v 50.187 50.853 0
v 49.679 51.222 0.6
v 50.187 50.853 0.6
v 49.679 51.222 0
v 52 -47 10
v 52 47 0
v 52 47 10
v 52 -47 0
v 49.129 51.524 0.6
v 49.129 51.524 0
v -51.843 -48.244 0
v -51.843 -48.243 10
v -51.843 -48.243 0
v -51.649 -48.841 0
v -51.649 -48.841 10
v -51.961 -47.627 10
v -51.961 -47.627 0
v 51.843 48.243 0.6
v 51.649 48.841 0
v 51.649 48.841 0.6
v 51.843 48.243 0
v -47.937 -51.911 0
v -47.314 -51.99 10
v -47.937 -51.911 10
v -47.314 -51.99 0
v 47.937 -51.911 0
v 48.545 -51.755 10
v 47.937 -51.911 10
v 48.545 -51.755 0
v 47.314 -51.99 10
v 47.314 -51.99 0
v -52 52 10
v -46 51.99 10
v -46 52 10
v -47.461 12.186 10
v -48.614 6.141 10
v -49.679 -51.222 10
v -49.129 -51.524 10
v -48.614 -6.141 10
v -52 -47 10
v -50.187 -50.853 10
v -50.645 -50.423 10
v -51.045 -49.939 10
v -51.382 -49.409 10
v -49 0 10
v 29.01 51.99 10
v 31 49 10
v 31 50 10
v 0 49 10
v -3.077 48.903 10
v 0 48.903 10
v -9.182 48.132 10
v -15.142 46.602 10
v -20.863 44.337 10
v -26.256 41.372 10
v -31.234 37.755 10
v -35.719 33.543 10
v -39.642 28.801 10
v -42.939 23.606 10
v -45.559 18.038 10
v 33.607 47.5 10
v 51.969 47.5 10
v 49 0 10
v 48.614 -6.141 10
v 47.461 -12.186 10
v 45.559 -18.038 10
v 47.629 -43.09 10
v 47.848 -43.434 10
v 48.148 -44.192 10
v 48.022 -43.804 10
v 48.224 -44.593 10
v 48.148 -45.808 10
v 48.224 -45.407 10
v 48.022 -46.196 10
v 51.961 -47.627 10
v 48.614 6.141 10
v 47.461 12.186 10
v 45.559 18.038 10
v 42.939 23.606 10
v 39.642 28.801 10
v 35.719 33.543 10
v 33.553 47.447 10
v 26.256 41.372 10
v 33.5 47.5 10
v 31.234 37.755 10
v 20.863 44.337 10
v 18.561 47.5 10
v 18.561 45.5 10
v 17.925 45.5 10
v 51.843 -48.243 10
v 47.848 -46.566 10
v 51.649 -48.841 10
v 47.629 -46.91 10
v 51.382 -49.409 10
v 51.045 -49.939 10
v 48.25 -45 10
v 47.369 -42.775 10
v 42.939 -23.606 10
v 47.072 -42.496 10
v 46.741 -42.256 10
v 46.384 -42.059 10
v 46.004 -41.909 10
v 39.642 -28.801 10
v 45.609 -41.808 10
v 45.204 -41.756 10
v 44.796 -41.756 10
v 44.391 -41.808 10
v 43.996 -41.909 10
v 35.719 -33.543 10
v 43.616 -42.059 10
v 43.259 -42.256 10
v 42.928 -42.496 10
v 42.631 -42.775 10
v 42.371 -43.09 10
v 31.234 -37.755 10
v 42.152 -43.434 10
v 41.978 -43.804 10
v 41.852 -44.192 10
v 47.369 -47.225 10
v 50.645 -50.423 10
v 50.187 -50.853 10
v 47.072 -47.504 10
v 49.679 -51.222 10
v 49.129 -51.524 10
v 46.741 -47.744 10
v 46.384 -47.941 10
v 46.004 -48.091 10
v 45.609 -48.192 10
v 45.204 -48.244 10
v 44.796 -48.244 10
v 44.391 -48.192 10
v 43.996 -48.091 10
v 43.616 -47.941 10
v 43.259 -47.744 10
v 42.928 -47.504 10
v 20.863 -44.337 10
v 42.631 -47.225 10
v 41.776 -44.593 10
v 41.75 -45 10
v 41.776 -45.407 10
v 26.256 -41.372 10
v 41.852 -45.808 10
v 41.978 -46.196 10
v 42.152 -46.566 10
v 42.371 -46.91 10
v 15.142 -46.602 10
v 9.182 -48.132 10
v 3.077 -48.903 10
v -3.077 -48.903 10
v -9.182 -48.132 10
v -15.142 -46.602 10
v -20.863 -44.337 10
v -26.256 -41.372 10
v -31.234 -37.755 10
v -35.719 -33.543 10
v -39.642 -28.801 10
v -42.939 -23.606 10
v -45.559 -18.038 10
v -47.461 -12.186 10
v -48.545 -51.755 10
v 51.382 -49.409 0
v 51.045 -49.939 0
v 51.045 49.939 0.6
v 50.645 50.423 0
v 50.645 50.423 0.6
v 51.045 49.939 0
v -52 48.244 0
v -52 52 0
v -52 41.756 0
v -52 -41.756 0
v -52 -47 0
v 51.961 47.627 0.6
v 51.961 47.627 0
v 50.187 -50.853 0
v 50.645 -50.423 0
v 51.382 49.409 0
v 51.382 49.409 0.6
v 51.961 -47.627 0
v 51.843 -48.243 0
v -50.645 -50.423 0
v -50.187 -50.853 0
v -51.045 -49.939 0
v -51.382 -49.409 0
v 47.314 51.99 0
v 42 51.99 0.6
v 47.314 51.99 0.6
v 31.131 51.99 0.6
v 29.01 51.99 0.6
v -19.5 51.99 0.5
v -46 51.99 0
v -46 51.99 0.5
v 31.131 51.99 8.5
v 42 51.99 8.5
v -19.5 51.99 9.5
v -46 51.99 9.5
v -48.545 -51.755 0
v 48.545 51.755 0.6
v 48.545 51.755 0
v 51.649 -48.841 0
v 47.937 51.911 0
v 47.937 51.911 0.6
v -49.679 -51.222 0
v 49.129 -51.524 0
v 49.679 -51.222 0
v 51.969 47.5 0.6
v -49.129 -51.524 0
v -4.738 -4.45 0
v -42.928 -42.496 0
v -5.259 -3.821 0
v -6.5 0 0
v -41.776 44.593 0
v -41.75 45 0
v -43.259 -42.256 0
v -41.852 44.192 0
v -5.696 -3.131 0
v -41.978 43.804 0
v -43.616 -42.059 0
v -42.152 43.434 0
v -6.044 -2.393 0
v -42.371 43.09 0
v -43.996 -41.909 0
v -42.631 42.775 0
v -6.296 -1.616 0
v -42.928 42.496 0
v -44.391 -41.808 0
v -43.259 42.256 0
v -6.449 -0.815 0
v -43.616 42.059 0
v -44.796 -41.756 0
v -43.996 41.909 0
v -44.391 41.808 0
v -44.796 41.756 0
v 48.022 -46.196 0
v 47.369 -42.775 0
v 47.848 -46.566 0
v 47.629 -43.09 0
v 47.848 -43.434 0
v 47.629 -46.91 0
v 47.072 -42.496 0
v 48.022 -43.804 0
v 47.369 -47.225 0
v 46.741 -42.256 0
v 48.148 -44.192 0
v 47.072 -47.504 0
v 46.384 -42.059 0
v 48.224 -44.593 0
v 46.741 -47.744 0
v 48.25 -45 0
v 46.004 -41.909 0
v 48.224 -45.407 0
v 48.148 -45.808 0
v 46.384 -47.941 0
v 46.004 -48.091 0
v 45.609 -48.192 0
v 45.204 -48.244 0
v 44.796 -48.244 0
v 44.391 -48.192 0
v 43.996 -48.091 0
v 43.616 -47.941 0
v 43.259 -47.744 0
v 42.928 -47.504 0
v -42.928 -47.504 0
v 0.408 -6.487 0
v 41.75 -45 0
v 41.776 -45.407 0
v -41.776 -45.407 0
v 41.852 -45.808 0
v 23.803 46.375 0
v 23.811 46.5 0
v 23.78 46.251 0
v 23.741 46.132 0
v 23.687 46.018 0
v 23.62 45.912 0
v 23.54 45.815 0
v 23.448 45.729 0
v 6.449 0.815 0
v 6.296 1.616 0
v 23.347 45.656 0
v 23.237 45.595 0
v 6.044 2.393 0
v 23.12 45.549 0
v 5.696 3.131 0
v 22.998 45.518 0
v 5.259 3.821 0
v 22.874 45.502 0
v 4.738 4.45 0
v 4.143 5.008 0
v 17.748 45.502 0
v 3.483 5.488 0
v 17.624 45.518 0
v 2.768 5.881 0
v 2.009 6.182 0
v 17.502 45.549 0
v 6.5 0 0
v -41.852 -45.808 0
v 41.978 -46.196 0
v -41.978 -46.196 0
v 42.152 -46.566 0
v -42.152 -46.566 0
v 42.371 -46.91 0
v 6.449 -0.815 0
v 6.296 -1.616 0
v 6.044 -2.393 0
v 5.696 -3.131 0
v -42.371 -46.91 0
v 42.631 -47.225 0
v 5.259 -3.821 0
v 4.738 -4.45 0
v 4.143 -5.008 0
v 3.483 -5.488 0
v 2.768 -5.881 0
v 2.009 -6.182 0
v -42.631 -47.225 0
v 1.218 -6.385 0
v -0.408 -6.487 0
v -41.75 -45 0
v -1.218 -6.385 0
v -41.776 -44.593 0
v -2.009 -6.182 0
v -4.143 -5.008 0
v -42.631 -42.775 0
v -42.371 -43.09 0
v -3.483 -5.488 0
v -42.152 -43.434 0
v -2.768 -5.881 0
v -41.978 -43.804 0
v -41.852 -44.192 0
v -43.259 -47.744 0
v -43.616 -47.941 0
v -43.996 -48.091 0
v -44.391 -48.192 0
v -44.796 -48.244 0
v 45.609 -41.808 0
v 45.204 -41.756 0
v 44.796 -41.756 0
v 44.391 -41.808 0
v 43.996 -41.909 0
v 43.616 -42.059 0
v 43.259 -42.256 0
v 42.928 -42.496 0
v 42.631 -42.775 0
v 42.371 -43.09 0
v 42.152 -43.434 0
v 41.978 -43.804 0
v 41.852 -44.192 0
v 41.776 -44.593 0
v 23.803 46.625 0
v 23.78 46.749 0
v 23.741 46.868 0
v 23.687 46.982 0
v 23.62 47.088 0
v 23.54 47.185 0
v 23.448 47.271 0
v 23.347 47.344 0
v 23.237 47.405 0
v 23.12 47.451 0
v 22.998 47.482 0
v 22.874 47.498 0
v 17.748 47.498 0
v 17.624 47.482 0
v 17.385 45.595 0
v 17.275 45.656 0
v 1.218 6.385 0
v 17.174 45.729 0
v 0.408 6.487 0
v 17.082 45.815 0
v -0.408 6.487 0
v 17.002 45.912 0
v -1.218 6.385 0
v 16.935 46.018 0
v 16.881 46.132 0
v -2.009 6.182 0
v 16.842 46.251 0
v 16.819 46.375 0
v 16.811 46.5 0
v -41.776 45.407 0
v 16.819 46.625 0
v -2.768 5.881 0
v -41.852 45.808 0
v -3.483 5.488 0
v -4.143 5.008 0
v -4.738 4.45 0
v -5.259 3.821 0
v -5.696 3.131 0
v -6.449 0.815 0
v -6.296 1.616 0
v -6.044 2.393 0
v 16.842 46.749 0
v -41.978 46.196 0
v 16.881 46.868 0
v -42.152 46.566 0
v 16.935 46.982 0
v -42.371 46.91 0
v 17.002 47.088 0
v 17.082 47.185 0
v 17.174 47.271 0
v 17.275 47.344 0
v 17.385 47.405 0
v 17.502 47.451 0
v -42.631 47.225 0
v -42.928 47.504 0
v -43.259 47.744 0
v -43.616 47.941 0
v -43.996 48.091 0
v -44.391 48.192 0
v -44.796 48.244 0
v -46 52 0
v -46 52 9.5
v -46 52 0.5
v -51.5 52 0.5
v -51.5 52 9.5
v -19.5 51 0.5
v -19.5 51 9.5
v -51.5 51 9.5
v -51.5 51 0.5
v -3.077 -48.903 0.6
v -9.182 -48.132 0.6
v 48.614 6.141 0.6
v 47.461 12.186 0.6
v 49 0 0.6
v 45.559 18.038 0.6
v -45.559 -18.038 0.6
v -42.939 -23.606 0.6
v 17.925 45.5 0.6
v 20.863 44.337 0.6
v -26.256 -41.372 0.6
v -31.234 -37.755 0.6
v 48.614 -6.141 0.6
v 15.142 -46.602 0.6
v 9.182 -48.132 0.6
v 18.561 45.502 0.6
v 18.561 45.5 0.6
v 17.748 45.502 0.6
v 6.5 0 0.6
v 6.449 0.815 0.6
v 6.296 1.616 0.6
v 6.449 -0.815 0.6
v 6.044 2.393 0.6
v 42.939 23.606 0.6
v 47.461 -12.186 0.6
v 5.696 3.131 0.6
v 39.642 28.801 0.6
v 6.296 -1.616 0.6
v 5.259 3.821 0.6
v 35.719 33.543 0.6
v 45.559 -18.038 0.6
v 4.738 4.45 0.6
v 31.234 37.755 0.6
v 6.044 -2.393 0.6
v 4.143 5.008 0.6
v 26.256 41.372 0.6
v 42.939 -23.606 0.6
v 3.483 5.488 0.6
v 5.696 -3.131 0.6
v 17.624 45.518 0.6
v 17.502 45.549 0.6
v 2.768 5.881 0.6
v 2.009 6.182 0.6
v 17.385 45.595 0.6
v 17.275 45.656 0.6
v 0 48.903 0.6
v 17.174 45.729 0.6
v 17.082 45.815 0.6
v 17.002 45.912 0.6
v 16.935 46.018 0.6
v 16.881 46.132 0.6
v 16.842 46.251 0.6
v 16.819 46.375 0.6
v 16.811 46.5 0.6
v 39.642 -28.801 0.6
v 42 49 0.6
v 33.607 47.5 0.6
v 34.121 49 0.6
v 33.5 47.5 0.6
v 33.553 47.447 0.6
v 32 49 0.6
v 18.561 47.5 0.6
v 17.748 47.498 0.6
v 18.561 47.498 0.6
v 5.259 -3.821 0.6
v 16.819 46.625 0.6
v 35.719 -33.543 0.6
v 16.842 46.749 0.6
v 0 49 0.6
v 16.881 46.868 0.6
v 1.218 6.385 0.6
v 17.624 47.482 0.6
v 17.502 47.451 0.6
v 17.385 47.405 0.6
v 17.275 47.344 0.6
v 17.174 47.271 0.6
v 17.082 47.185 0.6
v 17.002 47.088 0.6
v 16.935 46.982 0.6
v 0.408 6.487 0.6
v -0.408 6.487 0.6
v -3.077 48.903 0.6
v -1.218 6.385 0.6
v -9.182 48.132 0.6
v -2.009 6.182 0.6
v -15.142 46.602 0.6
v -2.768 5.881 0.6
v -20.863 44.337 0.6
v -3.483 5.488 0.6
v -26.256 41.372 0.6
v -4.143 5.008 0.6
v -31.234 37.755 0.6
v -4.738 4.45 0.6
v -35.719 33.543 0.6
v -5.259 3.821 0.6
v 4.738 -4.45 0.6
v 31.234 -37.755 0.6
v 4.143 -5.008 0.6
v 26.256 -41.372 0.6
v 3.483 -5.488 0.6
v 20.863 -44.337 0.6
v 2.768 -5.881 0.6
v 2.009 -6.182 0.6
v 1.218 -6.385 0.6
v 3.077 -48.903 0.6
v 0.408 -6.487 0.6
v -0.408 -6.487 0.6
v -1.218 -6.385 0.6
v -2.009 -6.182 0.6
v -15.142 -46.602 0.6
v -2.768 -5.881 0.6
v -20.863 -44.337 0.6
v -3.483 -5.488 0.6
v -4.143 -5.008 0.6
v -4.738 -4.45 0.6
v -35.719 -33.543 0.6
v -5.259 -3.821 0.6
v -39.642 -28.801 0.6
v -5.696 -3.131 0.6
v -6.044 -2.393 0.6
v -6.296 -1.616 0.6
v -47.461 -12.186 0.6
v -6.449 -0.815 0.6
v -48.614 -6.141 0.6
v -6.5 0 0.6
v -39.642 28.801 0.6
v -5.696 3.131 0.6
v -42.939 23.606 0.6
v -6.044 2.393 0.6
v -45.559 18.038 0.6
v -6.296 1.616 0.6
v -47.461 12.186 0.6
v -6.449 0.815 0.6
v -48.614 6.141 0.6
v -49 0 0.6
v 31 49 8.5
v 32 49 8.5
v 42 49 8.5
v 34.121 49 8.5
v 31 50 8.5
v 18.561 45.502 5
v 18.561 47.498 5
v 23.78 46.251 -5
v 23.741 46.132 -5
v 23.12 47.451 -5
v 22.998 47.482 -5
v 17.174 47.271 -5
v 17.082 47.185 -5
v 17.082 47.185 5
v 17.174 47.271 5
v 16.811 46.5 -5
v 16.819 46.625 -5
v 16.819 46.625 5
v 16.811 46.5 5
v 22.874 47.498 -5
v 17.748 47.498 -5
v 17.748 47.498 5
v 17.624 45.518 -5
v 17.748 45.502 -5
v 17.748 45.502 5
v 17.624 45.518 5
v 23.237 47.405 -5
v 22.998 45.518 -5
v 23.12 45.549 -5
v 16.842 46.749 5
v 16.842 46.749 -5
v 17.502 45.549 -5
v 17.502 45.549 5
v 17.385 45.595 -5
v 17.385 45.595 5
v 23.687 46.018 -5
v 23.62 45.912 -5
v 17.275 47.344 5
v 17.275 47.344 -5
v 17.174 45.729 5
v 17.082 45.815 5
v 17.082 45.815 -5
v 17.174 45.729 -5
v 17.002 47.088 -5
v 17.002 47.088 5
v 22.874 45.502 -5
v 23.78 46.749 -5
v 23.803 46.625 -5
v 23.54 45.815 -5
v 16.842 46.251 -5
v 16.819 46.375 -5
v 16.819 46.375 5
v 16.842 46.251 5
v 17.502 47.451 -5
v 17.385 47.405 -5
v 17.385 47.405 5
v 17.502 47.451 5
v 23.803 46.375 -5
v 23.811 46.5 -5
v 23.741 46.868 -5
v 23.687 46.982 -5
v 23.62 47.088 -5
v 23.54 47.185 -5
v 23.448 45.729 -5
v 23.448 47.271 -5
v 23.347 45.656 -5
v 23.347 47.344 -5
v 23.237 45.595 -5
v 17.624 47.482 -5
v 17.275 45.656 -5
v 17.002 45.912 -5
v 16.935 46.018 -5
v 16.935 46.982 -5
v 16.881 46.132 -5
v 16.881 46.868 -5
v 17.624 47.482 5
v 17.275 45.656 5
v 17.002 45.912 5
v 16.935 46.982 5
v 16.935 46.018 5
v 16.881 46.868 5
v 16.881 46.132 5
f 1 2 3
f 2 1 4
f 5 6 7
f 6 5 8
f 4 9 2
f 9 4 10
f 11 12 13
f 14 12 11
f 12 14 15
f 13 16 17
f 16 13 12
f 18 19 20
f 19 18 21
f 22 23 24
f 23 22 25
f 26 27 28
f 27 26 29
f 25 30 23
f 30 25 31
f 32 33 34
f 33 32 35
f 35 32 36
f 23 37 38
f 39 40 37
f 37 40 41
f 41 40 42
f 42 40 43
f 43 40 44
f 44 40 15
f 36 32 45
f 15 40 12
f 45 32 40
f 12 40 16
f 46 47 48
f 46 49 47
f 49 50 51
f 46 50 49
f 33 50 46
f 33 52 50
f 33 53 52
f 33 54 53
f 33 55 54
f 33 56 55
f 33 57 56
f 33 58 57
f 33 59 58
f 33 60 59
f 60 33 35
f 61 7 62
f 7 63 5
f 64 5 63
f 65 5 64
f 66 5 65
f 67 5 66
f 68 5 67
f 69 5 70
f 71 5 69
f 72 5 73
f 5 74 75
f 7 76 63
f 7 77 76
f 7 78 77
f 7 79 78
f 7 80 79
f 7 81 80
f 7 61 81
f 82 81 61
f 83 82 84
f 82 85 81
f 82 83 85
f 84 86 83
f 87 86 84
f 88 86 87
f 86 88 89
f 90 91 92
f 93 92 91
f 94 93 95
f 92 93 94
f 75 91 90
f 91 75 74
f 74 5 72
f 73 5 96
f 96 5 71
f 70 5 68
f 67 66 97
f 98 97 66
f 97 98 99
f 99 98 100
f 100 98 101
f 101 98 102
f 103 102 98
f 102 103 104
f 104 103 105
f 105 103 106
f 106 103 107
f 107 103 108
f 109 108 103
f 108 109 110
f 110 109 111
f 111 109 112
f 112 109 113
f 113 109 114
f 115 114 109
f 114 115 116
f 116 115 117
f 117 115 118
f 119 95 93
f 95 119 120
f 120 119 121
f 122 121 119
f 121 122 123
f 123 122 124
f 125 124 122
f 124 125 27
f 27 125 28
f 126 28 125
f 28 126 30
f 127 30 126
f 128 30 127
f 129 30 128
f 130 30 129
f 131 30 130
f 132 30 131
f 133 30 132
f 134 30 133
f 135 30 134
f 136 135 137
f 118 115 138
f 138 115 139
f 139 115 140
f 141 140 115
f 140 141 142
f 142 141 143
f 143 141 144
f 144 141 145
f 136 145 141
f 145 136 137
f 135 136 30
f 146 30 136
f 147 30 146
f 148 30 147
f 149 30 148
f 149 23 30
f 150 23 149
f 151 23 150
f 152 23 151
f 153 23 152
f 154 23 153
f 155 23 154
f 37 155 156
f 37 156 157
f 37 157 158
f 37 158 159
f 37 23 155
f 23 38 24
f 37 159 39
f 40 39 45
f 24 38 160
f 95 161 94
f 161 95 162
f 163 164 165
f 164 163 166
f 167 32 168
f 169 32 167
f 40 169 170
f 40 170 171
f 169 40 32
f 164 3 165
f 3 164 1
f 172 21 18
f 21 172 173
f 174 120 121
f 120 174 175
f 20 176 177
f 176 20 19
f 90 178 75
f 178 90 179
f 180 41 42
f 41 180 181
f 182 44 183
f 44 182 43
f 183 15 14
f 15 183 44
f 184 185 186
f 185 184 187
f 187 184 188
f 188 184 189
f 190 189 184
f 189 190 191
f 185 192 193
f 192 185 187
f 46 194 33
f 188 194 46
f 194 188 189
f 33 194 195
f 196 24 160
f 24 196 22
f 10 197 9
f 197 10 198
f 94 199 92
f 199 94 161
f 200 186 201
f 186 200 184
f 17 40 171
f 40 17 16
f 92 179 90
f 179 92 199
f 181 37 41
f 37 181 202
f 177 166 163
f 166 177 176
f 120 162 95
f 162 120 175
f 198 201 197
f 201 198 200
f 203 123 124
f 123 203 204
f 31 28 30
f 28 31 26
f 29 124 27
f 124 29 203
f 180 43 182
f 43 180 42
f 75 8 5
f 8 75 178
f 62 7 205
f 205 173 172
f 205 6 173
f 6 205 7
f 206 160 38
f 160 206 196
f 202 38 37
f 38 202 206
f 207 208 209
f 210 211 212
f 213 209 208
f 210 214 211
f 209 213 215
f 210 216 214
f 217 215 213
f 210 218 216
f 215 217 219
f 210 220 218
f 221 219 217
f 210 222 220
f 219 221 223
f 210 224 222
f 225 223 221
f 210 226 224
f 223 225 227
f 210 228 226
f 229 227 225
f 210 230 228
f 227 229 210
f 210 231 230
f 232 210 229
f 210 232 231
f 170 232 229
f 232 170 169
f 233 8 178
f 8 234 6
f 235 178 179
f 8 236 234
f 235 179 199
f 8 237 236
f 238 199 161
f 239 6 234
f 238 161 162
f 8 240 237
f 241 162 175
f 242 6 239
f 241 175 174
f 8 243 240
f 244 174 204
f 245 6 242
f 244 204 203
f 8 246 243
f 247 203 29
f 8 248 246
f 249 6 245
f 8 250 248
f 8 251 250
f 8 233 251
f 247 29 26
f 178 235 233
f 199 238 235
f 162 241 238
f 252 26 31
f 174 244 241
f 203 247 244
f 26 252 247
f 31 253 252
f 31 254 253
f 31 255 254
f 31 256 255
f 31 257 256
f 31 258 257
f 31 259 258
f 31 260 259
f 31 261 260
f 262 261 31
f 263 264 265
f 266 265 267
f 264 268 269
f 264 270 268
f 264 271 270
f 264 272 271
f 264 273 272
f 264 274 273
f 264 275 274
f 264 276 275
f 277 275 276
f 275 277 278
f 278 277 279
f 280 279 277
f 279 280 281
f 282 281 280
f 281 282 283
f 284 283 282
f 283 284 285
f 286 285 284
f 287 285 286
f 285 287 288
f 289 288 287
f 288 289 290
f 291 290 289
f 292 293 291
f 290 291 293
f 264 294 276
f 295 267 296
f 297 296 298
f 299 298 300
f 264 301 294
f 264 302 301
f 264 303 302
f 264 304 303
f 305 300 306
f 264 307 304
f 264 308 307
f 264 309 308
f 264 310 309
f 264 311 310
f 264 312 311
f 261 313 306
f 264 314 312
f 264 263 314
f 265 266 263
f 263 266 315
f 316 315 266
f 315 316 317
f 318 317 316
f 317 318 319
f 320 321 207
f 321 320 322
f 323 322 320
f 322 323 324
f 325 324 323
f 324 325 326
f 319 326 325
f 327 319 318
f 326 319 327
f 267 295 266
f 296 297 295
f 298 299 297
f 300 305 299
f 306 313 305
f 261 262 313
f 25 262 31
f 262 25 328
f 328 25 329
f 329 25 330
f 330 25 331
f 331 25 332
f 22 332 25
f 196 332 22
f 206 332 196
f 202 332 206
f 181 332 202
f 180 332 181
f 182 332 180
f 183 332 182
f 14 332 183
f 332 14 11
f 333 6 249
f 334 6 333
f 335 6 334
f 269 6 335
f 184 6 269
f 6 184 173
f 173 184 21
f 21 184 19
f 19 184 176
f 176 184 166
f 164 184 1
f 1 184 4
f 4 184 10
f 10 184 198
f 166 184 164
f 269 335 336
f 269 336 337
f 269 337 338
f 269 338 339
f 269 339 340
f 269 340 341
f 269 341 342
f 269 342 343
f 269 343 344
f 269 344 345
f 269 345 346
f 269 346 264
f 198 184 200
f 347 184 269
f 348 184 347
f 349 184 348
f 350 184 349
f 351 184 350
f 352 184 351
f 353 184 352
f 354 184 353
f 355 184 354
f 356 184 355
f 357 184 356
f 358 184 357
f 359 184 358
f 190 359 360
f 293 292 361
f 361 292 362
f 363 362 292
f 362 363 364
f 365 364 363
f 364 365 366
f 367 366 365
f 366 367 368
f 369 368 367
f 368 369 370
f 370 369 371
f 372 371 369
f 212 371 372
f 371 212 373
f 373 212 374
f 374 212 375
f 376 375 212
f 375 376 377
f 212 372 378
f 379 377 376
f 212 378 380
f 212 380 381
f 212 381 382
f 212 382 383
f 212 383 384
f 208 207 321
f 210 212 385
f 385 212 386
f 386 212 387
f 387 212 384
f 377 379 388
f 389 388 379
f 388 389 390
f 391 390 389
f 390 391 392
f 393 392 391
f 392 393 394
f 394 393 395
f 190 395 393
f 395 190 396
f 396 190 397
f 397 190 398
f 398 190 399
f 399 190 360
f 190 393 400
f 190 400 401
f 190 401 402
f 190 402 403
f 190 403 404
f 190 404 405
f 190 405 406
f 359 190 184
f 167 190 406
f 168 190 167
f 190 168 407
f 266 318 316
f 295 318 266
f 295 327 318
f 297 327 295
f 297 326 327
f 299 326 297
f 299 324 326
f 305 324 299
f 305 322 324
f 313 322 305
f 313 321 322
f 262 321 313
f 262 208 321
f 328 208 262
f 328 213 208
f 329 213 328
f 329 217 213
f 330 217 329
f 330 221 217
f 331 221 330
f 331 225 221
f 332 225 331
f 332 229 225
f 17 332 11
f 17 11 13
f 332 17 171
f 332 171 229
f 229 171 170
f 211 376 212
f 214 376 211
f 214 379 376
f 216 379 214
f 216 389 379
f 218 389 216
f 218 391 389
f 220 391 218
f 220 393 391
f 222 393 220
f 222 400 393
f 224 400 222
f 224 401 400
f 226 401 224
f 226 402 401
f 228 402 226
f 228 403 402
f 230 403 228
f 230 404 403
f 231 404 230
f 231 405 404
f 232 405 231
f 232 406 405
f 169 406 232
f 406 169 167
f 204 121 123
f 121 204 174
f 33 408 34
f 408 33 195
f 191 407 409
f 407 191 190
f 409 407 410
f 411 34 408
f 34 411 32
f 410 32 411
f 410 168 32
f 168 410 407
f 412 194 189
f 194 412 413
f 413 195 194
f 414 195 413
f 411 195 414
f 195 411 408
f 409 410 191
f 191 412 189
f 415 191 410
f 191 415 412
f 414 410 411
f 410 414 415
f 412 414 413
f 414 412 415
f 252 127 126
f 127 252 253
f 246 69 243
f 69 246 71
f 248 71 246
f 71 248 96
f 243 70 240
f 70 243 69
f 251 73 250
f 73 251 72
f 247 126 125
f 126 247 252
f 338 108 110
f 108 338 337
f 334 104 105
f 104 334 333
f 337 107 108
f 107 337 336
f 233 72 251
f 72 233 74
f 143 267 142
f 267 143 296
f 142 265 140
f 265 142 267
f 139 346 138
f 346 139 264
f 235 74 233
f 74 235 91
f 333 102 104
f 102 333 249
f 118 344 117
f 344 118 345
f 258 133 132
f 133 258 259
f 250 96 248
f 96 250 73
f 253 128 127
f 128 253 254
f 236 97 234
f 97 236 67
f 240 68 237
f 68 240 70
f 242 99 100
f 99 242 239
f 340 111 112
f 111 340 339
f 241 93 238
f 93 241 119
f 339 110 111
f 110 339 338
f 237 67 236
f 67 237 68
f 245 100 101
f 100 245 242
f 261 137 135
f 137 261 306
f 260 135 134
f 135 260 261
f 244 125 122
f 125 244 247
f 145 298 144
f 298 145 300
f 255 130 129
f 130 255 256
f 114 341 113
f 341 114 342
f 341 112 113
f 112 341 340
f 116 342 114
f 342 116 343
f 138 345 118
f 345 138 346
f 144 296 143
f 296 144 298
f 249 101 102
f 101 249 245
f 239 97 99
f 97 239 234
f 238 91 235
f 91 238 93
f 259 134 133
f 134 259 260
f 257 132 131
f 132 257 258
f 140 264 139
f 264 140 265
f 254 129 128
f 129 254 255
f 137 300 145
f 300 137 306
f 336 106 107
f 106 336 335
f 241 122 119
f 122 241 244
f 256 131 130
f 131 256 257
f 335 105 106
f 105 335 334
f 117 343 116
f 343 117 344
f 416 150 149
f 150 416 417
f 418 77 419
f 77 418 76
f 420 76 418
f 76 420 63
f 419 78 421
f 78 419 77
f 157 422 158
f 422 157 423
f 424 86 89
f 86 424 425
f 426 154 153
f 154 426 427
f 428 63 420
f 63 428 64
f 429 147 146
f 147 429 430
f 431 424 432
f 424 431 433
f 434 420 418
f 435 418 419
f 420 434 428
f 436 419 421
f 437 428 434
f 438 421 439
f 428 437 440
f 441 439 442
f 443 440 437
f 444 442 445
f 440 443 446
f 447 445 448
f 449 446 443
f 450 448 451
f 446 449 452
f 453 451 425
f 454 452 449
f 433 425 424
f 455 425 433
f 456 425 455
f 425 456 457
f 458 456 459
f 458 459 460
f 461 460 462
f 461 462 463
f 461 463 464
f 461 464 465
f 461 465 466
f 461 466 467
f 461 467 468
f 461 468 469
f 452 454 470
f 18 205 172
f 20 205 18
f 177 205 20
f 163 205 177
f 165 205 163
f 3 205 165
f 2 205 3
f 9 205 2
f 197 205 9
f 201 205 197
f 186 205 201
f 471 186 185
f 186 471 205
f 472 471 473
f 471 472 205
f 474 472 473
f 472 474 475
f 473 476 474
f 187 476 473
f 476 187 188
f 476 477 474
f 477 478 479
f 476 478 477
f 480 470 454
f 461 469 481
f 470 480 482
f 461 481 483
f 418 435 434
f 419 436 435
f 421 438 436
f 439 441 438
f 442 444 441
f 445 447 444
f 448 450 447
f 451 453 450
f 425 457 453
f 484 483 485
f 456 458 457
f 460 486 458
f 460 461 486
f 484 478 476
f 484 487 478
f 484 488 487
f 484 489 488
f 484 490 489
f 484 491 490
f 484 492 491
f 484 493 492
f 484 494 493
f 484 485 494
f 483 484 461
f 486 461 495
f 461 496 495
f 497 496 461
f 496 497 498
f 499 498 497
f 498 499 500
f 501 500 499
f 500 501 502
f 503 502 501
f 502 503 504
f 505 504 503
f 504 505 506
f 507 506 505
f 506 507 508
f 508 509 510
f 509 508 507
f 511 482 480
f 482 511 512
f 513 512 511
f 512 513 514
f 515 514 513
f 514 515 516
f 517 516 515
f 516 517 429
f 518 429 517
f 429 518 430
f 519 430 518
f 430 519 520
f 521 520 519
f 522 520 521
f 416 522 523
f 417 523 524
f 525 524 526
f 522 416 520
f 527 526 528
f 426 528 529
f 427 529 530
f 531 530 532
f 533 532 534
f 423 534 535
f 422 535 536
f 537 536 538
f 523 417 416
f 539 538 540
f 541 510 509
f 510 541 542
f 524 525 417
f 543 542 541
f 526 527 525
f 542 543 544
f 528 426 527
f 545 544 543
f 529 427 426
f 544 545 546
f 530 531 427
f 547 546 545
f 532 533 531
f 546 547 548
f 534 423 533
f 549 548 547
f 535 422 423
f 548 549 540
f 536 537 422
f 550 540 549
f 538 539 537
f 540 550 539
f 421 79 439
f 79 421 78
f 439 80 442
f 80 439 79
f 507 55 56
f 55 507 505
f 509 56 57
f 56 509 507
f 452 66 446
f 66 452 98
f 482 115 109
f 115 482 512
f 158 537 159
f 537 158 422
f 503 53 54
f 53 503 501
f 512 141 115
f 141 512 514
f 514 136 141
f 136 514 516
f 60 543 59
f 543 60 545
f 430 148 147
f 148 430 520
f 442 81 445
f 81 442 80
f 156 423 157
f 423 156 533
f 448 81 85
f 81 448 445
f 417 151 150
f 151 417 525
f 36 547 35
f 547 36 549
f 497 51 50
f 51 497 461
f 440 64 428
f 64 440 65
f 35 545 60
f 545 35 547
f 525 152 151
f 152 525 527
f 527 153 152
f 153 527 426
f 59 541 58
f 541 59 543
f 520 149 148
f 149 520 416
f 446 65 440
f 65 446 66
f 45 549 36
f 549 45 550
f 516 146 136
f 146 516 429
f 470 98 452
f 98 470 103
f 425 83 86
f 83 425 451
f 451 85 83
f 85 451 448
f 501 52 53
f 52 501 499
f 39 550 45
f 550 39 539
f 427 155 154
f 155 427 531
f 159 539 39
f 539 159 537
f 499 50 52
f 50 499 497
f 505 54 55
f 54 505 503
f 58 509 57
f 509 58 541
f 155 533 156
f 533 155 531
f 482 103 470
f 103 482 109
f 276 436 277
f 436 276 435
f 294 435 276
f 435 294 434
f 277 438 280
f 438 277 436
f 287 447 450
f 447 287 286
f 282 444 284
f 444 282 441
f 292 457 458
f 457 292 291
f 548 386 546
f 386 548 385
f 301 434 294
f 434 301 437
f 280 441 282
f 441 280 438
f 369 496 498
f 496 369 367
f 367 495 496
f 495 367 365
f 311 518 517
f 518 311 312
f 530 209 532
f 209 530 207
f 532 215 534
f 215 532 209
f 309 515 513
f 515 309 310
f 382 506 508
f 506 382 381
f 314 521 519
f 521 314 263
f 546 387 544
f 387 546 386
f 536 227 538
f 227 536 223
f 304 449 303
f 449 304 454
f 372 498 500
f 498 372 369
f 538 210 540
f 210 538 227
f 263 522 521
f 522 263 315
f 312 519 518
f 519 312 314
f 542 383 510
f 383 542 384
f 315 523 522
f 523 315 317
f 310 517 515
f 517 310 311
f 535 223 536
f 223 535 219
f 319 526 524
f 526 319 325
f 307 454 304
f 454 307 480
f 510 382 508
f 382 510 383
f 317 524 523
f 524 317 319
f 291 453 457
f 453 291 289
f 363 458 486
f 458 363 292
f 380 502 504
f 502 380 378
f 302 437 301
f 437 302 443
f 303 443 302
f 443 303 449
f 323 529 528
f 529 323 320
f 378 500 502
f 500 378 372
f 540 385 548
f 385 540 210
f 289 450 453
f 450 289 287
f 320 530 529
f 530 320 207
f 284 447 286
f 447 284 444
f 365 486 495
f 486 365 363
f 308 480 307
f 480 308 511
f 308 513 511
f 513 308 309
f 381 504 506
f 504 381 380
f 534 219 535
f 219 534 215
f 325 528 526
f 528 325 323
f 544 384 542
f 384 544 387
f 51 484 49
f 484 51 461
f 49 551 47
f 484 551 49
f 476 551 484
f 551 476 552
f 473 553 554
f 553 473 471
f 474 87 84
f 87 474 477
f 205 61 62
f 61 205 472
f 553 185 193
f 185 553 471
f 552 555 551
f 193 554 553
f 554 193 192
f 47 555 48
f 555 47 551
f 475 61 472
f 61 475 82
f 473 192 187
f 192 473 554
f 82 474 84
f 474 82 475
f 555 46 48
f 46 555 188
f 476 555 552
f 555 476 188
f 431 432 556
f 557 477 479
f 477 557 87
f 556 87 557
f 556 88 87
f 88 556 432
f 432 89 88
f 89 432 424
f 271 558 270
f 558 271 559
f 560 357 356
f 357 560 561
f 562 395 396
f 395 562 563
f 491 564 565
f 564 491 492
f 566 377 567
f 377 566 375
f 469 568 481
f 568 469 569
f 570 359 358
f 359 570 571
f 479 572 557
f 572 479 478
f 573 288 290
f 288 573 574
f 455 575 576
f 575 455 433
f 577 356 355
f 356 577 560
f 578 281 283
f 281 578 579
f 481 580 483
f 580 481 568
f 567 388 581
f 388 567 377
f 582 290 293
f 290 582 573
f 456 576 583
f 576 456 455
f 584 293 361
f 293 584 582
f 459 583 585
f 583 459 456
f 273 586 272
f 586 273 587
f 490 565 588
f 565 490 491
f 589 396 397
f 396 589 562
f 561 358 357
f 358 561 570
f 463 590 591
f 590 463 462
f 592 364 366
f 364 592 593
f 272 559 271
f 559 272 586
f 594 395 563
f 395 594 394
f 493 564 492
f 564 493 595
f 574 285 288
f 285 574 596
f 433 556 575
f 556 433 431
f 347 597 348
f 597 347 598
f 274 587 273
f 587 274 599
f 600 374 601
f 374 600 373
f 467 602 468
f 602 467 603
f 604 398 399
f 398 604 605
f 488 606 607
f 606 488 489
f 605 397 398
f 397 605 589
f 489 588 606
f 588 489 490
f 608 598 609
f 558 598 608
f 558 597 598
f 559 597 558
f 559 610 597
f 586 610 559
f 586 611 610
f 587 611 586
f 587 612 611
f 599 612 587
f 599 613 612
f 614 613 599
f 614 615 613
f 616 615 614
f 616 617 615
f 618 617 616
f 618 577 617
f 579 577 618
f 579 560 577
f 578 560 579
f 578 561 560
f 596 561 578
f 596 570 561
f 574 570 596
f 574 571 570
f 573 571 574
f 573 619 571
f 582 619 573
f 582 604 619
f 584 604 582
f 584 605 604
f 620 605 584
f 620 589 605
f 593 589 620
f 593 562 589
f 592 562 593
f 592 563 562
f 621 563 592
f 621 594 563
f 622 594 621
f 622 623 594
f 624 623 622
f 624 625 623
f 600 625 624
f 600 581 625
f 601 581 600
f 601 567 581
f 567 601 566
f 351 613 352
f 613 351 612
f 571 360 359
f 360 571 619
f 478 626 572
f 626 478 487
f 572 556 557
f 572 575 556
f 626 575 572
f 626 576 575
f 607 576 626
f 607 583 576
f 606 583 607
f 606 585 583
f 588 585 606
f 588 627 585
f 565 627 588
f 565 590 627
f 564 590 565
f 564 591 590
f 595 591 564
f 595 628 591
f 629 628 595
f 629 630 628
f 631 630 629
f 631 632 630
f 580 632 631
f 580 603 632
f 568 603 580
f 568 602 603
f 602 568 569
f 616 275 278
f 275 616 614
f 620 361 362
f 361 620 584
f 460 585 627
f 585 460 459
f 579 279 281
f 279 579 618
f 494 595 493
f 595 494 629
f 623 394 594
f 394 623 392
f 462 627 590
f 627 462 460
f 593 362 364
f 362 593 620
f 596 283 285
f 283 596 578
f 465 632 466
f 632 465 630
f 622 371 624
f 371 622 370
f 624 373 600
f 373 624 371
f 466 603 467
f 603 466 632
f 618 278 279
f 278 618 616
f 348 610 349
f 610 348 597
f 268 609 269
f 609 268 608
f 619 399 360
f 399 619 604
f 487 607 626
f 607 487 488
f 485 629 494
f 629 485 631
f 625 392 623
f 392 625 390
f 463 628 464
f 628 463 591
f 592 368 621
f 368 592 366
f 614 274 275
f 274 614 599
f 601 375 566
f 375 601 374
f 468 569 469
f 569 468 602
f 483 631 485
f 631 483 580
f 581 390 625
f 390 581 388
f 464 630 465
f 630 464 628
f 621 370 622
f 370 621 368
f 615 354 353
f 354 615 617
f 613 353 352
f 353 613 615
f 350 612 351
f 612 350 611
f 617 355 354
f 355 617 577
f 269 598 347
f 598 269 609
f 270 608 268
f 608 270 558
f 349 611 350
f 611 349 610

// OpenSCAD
$fn = 50;


union() {
	difference() {
		union() {
			hull() {
				translate(v = [-47.0000000000, 47.0000000000, 0]) {
					cylinder(h = 10, r = 5);
				}
				translate(v = [47.0000000000, 47.0000000000, 0]) {
					cylinder(h = 10, r = 5);
				}
				translate(v = [-47.0000000000, -47.0000000000, 0]) {
					cylinder(h = 10, r = 5);
				}
				translate(v = [47.0000000000, -47.0000000000, 0]) {
					cylinder(h = 10, r = 5);
				}
			}
			translate(v = [-52.0000000000, 46.0000000000, 0]) {
				cube(size = [6, 6, 10]);
			}
		}
		union() {
			translate(v = [-52.5000000000, -45.0000000000, -250.0000000000]) {
				rotate(a = [0, 0, 0]) {
					difference() {
						union() {
							hull() {
								translate(v = [7.5000000000, 0, 0]) {
									cylinder(h = 250, r = 3.2500000000, r1 = 3.2500000000, r2 = 3.2500000000);
								}
								translate(v = [-7.5000000000, 0, 0]) {
									cylinder(h = 250, r = 3.2500000000, r1 = 3.2500000000, r2 = 3.2500000000);
								}
							}
						}
						union();
					}
				}
			}
			translate(v = [-52.5000000000, 45.0000000000, -250.0000000000]) {
				rotate(a = [0, 0, 0]) {
					difference() {
						union() {
							hull() {
								translate(v = [7.5000000000, 0, 0]) {
									cylinder(h = 250, r = 3.2500000000, r1 = 3.2500000000, r2 = 3.2500000000);
								}
								translate(v = [-7.5000000000, 0, 0]) {
									cylinder(h = 250, r = 3.2500000000, r1 = 3.2500000000, r2 = 3.2500000000);
								}
							}
						}
						union();
					}
				}
			}
			translate(v = [-51.5000000000, 51.0000000000, 0.5000000000]) {
				cube(size = [32, 1, 9.0000000000]);
			}
			translate(v = [45.0000000000, -45.0000000000, 0]) {
				cylinder(h = 100, r = 3.2500000000);
			}
			translate(v = [0, 0, 0.6000000000]) {
				cylinder(h = 12.4000000000, r = 49.0000000000);
			}
			translate(v = [0, 0, -5.0000000000]) {
				cylinder(h = 10, r = 6.5000000000);
			}
			translate(v = [0.0000000000, 47.5000000000, 0.6000000000]) {
				cube(size = [52.0000000000, 1.5000000000, 12.4000000000]);
			}
			translate(v = [42.0000000000, 47.5000000000, 0.6000000000]) {
				cube(size = [10, 4.5000000000, 12.4000000000]);
			}
			translate(v = [31.0000000000, 47.5000000000, 8.5000000000]) {
				cube(size = [21, 4.5000000000, 1.5000000000]);
			}
			translate(v = [28.2500000000, 52.7500000000, 0.6000000000]) {
				rotate(a = [0, 0, -45]) {
					cube(size = [7.5000000000, 1.5000000000, 12.4000000000]);
				}
			}
			translate(v = [11.0610000000, 45.5000000000, 0.6000000000]) {
				cube(size = [7.5000000000, 2, 9.4000000000]);
			}
		}
	}
	union() {
		translate(v = [20.3110000000, 46.5000000000, -5.0000000000]) {
			rotate(a = [0, 0, 0]) {
				difference() {
					union() {
						#hull() {
							#translate(v = [2.5000000000, 0, 0]) {
								cylinder(h = 10, r = 1.0000000000, r1 = 1.0000000000, r2 = 1.0000000000);
							}
							#translate(v = [-2.5000000000, 0, 0]) {
								cylinder(h = 10, r = 1.0000000000, r1 = 1.0000000000, r2 = 1.0000000000);
							}
						}
					}
					union();
				}
			}
		}
	}
}
